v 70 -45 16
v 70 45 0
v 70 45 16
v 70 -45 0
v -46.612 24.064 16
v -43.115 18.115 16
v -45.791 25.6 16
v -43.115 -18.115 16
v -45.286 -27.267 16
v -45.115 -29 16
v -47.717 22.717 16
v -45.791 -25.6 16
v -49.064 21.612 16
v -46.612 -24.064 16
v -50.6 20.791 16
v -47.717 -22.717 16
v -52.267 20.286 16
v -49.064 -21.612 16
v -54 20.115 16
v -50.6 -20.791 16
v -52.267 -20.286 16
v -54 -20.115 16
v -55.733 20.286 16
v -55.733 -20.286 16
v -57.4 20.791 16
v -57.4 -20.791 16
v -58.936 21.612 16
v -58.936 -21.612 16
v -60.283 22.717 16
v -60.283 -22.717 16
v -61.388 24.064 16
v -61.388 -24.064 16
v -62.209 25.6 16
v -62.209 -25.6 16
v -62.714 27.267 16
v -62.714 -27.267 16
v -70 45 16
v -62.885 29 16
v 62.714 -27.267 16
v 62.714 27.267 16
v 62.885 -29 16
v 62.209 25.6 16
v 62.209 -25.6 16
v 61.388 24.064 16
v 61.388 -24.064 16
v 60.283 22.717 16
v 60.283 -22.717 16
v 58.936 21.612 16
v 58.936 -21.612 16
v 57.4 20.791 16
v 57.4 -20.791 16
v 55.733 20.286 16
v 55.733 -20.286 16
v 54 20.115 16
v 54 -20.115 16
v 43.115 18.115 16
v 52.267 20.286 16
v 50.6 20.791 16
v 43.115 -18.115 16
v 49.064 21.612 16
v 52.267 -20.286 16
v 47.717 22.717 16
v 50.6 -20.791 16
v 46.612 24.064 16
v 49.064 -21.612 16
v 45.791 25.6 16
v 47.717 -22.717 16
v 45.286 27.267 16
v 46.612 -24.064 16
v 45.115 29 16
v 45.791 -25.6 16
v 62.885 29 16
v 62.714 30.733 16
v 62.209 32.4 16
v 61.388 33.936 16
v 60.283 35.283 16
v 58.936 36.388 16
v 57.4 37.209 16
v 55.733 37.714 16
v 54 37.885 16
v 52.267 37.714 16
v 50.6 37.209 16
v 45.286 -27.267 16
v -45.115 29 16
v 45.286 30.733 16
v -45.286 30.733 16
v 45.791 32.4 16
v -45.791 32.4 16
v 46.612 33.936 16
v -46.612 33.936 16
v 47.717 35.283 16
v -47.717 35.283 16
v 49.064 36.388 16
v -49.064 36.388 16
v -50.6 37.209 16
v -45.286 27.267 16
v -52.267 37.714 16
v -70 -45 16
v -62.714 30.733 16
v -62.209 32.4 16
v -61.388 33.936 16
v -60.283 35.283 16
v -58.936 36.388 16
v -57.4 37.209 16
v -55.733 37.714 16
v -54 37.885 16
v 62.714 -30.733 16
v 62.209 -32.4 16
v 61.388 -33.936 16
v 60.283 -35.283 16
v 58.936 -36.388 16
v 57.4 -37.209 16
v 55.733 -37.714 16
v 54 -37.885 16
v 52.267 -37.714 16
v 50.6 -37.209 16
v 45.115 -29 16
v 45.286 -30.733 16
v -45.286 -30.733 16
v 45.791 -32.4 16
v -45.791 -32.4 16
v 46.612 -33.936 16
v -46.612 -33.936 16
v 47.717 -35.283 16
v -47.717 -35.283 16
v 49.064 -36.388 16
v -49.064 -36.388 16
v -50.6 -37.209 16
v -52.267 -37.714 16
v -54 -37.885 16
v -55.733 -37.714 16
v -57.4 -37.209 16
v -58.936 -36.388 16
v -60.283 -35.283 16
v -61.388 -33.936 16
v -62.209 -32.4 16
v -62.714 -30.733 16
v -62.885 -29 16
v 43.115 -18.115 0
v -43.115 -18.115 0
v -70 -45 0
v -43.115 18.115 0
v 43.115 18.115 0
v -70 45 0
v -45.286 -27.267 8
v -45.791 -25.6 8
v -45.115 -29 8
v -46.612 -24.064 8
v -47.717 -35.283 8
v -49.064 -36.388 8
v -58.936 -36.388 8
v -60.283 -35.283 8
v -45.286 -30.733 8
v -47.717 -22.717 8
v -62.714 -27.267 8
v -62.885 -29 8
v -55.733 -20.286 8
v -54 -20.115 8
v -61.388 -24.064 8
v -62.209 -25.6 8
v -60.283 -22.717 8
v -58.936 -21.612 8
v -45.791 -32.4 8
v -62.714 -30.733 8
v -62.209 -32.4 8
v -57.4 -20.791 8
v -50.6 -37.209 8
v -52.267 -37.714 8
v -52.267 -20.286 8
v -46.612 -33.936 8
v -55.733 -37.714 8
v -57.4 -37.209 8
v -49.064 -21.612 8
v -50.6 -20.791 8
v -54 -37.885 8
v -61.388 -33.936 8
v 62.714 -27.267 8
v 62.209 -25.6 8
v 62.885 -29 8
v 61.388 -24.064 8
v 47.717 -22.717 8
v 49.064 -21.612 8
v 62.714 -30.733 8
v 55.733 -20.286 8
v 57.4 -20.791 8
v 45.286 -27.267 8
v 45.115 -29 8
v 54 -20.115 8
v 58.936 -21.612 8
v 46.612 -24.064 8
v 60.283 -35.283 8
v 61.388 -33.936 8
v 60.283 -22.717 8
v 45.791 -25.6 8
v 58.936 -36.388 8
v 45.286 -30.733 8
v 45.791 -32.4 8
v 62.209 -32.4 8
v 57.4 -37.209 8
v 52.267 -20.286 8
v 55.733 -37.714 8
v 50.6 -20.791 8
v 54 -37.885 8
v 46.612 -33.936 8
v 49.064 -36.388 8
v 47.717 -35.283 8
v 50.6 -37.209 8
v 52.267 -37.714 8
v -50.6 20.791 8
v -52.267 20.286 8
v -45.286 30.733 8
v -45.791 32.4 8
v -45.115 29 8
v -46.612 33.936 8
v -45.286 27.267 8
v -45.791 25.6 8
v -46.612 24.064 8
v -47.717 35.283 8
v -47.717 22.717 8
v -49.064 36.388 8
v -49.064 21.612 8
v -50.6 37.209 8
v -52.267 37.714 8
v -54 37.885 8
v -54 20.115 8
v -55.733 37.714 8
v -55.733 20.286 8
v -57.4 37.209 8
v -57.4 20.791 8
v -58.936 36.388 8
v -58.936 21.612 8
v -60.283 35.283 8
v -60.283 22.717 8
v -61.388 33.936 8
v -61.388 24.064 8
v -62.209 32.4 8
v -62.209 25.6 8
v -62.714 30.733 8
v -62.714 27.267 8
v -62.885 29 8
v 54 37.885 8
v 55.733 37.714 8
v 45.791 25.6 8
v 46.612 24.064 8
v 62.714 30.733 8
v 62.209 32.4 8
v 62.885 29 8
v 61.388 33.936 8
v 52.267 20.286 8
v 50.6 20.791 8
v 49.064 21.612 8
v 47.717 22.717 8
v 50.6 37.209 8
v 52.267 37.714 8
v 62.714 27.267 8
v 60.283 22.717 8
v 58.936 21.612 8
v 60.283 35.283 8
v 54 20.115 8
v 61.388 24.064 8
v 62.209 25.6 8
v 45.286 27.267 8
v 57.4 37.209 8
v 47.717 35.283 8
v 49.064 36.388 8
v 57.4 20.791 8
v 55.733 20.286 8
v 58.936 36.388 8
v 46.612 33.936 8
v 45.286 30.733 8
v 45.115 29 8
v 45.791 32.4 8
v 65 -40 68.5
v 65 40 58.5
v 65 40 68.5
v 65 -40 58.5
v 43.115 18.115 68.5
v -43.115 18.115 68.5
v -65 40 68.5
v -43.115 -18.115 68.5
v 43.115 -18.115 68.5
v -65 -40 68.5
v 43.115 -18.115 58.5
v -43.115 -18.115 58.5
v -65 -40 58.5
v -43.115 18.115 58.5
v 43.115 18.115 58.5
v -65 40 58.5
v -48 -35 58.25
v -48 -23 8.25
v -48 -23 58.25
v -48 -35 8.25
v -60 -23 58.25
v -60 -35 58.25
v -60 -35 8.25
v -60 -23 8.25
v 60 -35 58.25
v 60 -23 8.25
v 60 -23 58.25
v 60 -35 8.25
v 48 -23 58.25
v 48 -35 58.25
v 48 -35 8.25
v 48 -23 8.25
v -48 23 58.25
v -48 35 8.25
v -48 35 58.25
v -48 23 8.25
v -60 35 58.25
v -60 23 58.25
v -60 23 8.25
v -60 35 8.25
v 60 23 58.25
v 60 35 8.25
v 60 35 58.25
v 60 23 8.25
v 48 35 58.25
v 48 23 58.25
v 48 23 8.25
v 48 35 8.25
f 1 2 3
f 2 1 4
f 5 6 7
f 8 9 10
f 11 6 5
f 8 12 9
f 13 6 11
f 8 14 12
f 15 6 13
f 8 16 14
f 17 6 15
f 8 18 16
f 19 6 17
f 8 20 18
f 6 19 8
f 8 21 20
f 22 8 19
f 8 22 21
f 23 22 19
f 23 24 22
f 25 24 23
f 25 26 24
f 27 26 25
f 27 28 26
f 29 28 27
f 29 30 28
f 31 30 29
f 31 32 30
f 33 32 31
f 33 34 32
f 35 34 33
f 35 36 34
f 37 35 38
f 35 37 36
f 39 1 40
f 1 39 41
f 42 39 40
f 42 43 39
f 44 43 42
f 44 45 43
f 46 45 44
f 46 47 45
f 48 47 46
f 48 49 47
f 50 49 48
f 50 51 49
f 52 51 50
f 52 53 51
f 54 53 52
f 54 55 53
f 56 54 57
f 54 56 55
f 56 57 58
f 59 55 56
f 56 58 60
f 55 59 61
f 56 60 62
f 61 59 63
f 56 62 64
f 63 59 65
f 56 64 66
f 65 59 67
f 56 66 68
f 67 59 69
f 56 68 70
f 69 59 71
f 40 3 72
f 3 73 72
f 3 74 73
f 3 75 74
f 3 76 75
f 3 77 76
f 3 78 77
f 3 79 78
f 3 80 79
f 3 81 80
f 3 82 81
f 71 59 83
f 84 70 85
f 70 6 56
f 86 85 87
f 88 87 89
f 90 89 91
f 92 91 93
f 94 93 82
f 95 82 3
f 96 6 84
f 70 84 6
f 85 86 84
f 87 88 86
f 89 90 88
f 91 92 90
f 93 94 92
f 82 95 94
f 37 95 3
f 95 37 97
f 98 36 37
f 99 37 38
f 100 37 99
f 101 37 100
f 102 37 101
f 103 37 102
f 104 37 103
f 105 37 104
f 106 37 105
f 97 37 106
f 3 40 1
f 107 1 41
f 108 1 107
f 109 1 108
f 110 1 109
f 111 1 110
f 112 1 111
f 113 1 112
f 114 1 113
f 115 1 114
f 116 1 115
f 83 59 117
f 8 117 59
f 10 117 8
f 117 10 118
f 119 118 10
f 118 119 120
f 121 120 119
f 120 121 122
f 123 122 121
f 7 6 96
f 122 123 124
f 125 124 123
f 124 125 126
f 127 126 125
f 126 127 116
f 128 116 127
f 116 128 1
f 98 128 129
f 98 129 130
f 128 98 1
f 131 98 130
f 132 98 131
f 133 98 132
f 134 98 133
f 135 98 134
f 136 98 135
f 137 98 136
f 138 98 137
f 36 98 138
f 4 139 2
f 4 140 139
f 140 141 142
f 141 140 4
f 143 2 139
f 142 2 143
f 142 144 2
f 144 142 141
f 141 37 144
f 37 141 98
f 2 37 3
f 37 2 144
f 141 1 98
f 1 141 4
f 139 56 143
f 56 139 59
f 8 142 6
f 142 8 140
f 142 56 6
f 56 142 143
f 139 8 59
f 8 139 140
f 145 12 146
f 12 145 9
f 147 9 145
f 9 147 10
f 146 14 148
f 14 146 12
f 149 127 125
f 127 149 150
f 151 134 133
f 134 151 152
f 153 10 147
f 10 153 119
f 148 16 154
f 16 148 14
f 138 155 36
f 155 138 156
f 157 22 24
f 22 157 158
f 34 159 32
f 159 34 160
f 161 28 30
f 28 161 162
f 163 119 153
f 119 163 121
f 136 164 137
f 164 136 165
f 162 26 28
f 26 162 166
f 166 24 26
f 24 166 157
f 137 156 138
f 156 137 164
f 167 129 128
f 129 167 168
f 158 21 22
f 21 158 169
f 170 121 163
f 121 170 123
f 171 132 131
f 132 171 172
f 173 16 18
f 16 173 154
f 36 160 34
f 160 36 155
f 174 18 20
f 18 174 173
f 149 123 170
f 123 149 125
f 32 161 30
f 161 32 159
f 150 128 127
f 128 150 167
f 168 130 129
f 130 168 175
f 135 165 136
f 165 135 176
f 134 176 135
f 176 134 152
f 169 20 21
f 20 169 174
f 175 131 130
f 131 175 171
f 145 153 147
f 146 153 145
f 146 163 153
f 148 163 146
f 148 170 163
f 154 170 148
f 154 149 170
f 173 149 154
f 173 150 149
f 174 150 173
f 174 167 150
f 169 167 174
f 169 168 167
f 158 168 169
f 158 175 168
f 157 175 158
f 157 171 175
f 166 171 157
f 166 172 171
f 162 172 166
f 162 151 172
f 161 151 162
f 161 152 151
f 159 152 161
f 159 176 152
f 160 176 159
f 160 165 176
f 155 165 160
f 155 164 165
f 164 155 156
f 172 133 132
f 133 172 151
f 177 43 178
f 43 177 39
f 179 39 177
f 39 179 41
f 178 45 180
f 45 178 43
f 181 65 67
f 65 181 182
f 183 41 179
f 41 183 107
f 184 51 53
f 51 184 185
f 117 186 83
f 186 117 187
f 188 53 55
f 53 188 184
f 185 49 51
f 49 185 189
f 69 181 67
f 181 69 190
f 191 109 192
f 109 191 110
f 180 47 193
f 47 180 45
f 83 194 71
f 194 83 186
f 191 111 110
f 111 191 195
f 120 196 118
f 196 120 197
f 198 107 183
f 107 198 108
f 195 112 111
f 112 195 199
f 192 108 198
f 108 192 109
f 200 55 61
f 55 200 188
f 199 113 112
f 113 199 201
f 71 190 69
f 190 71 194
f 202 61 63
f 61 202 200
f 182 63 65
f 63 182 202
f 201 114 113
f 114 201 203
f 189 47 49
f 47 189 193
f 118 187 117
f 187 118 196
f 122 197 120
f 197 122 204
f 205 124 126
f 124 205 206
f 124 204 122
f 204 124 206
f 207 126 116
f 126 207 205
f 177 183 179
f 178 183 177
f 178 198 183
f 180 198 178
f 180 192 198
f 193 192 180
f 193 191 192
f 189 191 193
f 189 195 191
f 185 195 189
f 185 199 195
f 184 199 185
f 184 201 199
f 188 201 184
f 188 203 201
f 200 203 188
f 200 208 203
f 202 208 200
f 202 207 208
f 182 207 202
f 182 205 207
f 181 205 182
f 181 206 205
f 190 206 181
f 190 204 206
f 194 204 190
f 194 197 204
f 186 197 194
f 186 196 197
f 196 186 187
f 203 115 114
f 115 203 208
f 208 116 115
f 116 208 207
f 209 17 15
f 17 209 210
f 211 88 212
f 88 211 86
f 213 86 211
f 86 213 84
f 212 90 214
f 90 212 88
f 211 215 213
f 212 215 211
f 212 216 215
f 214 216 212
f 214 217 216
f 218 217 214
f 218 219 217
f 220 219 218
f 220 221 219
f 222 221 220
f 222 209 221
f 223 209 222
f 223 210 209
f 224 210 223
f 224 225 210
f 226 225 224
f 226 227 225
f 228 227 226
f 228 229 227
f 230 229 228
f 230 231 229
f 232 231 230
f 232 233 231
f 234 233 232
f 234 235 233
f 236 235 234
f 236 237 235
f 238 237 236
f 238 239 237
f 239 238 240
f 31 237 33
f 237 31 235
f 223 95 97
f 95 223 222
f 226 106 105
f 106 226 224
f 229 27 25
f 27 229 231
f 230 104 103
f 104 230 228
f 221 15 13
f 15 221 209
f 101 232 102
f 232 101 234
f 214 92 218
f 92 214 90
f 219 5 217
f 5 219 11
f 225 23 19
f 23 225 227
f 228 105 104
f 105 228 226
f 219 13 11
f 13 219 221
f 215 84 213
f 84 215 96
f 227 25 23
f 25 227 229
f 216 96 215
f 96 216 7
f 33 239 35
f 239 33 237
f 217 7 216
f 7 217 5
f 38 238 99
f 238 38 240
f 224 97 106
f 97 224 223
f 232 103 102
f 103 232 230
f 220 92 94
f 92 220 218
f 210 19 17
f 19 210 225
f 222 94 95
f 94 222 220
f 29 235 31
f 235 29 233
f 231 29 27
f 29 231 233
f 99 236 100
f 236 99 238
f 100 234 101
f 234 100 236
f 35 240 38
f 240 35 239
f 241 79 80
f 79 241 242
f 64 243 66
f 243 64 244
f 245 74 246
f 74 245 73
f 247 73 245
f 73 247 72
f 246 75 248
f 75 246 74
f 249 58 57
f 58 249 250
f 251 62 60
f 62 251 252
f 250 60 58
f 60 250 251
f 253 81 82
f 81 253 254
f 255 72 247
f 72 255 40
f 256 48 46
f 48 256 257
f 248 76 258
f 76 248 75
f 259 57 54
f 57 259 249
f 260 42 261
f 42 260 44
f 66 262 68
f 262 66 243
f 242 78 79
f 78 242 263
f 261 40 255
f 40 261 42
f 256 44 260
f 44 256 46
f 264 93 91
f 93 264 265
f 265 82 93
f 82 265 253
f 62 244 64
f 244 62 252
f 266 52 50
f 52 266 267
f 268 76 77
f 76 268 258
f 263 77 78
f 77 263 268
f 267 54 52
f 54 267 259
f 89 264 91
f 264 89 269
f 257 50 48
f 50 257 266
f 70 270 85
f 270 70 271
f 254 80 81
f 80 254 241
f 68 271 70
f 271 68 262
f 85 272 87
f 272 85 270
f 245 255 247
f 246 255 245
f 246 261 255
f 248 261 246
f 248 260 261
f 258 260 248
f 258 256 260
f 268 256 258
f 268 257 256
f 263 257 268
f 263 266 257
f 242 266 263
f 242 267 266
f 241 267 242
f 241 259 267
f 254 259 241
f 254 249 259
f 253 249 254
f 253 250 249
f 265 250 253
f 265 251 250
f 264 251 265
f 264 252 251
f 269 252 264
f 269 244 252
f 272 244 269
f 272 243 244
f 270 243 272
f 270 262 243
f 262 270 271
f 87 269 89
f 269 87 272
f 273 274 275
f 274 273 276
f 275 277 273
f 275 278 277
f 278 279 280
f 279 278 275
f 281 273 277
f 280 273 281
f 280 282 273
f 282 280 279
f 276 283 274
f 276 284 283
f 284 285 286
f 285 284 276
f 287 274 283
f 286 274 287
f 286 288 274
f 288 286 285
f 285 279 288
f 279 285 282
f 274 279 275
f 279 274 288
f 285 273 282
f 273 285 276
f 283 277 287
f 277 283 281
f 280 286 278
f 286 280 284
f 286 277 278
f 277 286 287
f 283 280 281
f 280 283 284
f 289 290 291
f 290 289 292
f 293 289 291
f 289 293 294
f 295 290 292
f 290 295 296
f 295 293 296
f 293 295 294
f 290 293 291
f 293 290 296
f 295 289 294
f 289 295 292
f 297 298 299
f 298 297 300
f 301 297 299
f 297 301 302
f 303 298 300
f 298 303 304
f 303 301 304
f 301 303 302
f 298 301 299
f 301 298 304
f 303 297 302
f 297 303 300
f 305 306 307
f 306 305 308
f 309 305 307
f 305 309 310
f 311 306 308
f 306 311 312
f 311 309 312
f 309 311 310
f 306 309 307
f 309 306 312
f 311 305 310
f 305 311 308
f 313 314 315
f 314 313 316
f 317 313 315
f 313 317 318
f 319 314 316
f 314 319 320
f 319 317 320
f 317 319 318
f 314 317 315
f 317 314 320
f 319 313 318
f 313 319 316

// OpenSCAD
$fn = 32;

// ------------------------------------------------------------------------
// Frame cube: base 140 x 90 mm, posts 50 mm tall
// Every part is its own module, assembly() places every instance.
// ------------------------------------------------------------------------

// --- part 1 ---
module base_frame() {
  difference() {
    translate([-70, -45, 0]) cube([140, 90, 16]);
    translate([-43.115, -18.115, -1]) cube([86.23, 36.23, 18]);
    translate([-54, -29, 8]) cylinder(h = 9, d = 17.77);
    translate([54, -29, 8]) cylinder(h = 9, d = 17.77);
    translate([-54, 29, 8]) cylinder(h = 9, d = 17.77);
    translate([54, 29, 8]) cylinder(h = 9, d = 17.77);
  }
}

// --- part 2 ---
module corner_post() {
  translate([-6, -6, 0]) cube([12, 12, 50]);
}

// --- part 3 ---
module top_frame() {
  difference() {
    translate([-65, -40, 0]) cube([130, 80, 10]);
    translate([-43.115, -18.115, -1]) cube([86.23, 36.23, 12]);
  }
}

// --- assembly ---
module assembly() {
  color([0.80, 0.24, 0.20]) translate([0, 0, 0]) rotate([0, 0, 0]) base_frame();
  color([0.20, 0.45, 0.75]) translate([-54, -29, 8.25]) rotate([0, 0, 0]) corner_post();
  color([0.25, 0.62, 0.32]) translate([54, -29, 8.25]) rotate([0, 0, 0]) corner_post();
  color([0.92, 0.70, 0.18]) translate([-54, 29, 8.25]) rotate([0, 0, 0]) corner_post();
  color([0.58, 0.35, 0.70]) translate([54, 29, 8.25]) rotate([0, 0, 0]) corner_post();
  color([0.16, 0.66, 0.66]) translate([0, 0, 58.5]) rotate([0, 0, 0]) top_frame();
}

assembly();
